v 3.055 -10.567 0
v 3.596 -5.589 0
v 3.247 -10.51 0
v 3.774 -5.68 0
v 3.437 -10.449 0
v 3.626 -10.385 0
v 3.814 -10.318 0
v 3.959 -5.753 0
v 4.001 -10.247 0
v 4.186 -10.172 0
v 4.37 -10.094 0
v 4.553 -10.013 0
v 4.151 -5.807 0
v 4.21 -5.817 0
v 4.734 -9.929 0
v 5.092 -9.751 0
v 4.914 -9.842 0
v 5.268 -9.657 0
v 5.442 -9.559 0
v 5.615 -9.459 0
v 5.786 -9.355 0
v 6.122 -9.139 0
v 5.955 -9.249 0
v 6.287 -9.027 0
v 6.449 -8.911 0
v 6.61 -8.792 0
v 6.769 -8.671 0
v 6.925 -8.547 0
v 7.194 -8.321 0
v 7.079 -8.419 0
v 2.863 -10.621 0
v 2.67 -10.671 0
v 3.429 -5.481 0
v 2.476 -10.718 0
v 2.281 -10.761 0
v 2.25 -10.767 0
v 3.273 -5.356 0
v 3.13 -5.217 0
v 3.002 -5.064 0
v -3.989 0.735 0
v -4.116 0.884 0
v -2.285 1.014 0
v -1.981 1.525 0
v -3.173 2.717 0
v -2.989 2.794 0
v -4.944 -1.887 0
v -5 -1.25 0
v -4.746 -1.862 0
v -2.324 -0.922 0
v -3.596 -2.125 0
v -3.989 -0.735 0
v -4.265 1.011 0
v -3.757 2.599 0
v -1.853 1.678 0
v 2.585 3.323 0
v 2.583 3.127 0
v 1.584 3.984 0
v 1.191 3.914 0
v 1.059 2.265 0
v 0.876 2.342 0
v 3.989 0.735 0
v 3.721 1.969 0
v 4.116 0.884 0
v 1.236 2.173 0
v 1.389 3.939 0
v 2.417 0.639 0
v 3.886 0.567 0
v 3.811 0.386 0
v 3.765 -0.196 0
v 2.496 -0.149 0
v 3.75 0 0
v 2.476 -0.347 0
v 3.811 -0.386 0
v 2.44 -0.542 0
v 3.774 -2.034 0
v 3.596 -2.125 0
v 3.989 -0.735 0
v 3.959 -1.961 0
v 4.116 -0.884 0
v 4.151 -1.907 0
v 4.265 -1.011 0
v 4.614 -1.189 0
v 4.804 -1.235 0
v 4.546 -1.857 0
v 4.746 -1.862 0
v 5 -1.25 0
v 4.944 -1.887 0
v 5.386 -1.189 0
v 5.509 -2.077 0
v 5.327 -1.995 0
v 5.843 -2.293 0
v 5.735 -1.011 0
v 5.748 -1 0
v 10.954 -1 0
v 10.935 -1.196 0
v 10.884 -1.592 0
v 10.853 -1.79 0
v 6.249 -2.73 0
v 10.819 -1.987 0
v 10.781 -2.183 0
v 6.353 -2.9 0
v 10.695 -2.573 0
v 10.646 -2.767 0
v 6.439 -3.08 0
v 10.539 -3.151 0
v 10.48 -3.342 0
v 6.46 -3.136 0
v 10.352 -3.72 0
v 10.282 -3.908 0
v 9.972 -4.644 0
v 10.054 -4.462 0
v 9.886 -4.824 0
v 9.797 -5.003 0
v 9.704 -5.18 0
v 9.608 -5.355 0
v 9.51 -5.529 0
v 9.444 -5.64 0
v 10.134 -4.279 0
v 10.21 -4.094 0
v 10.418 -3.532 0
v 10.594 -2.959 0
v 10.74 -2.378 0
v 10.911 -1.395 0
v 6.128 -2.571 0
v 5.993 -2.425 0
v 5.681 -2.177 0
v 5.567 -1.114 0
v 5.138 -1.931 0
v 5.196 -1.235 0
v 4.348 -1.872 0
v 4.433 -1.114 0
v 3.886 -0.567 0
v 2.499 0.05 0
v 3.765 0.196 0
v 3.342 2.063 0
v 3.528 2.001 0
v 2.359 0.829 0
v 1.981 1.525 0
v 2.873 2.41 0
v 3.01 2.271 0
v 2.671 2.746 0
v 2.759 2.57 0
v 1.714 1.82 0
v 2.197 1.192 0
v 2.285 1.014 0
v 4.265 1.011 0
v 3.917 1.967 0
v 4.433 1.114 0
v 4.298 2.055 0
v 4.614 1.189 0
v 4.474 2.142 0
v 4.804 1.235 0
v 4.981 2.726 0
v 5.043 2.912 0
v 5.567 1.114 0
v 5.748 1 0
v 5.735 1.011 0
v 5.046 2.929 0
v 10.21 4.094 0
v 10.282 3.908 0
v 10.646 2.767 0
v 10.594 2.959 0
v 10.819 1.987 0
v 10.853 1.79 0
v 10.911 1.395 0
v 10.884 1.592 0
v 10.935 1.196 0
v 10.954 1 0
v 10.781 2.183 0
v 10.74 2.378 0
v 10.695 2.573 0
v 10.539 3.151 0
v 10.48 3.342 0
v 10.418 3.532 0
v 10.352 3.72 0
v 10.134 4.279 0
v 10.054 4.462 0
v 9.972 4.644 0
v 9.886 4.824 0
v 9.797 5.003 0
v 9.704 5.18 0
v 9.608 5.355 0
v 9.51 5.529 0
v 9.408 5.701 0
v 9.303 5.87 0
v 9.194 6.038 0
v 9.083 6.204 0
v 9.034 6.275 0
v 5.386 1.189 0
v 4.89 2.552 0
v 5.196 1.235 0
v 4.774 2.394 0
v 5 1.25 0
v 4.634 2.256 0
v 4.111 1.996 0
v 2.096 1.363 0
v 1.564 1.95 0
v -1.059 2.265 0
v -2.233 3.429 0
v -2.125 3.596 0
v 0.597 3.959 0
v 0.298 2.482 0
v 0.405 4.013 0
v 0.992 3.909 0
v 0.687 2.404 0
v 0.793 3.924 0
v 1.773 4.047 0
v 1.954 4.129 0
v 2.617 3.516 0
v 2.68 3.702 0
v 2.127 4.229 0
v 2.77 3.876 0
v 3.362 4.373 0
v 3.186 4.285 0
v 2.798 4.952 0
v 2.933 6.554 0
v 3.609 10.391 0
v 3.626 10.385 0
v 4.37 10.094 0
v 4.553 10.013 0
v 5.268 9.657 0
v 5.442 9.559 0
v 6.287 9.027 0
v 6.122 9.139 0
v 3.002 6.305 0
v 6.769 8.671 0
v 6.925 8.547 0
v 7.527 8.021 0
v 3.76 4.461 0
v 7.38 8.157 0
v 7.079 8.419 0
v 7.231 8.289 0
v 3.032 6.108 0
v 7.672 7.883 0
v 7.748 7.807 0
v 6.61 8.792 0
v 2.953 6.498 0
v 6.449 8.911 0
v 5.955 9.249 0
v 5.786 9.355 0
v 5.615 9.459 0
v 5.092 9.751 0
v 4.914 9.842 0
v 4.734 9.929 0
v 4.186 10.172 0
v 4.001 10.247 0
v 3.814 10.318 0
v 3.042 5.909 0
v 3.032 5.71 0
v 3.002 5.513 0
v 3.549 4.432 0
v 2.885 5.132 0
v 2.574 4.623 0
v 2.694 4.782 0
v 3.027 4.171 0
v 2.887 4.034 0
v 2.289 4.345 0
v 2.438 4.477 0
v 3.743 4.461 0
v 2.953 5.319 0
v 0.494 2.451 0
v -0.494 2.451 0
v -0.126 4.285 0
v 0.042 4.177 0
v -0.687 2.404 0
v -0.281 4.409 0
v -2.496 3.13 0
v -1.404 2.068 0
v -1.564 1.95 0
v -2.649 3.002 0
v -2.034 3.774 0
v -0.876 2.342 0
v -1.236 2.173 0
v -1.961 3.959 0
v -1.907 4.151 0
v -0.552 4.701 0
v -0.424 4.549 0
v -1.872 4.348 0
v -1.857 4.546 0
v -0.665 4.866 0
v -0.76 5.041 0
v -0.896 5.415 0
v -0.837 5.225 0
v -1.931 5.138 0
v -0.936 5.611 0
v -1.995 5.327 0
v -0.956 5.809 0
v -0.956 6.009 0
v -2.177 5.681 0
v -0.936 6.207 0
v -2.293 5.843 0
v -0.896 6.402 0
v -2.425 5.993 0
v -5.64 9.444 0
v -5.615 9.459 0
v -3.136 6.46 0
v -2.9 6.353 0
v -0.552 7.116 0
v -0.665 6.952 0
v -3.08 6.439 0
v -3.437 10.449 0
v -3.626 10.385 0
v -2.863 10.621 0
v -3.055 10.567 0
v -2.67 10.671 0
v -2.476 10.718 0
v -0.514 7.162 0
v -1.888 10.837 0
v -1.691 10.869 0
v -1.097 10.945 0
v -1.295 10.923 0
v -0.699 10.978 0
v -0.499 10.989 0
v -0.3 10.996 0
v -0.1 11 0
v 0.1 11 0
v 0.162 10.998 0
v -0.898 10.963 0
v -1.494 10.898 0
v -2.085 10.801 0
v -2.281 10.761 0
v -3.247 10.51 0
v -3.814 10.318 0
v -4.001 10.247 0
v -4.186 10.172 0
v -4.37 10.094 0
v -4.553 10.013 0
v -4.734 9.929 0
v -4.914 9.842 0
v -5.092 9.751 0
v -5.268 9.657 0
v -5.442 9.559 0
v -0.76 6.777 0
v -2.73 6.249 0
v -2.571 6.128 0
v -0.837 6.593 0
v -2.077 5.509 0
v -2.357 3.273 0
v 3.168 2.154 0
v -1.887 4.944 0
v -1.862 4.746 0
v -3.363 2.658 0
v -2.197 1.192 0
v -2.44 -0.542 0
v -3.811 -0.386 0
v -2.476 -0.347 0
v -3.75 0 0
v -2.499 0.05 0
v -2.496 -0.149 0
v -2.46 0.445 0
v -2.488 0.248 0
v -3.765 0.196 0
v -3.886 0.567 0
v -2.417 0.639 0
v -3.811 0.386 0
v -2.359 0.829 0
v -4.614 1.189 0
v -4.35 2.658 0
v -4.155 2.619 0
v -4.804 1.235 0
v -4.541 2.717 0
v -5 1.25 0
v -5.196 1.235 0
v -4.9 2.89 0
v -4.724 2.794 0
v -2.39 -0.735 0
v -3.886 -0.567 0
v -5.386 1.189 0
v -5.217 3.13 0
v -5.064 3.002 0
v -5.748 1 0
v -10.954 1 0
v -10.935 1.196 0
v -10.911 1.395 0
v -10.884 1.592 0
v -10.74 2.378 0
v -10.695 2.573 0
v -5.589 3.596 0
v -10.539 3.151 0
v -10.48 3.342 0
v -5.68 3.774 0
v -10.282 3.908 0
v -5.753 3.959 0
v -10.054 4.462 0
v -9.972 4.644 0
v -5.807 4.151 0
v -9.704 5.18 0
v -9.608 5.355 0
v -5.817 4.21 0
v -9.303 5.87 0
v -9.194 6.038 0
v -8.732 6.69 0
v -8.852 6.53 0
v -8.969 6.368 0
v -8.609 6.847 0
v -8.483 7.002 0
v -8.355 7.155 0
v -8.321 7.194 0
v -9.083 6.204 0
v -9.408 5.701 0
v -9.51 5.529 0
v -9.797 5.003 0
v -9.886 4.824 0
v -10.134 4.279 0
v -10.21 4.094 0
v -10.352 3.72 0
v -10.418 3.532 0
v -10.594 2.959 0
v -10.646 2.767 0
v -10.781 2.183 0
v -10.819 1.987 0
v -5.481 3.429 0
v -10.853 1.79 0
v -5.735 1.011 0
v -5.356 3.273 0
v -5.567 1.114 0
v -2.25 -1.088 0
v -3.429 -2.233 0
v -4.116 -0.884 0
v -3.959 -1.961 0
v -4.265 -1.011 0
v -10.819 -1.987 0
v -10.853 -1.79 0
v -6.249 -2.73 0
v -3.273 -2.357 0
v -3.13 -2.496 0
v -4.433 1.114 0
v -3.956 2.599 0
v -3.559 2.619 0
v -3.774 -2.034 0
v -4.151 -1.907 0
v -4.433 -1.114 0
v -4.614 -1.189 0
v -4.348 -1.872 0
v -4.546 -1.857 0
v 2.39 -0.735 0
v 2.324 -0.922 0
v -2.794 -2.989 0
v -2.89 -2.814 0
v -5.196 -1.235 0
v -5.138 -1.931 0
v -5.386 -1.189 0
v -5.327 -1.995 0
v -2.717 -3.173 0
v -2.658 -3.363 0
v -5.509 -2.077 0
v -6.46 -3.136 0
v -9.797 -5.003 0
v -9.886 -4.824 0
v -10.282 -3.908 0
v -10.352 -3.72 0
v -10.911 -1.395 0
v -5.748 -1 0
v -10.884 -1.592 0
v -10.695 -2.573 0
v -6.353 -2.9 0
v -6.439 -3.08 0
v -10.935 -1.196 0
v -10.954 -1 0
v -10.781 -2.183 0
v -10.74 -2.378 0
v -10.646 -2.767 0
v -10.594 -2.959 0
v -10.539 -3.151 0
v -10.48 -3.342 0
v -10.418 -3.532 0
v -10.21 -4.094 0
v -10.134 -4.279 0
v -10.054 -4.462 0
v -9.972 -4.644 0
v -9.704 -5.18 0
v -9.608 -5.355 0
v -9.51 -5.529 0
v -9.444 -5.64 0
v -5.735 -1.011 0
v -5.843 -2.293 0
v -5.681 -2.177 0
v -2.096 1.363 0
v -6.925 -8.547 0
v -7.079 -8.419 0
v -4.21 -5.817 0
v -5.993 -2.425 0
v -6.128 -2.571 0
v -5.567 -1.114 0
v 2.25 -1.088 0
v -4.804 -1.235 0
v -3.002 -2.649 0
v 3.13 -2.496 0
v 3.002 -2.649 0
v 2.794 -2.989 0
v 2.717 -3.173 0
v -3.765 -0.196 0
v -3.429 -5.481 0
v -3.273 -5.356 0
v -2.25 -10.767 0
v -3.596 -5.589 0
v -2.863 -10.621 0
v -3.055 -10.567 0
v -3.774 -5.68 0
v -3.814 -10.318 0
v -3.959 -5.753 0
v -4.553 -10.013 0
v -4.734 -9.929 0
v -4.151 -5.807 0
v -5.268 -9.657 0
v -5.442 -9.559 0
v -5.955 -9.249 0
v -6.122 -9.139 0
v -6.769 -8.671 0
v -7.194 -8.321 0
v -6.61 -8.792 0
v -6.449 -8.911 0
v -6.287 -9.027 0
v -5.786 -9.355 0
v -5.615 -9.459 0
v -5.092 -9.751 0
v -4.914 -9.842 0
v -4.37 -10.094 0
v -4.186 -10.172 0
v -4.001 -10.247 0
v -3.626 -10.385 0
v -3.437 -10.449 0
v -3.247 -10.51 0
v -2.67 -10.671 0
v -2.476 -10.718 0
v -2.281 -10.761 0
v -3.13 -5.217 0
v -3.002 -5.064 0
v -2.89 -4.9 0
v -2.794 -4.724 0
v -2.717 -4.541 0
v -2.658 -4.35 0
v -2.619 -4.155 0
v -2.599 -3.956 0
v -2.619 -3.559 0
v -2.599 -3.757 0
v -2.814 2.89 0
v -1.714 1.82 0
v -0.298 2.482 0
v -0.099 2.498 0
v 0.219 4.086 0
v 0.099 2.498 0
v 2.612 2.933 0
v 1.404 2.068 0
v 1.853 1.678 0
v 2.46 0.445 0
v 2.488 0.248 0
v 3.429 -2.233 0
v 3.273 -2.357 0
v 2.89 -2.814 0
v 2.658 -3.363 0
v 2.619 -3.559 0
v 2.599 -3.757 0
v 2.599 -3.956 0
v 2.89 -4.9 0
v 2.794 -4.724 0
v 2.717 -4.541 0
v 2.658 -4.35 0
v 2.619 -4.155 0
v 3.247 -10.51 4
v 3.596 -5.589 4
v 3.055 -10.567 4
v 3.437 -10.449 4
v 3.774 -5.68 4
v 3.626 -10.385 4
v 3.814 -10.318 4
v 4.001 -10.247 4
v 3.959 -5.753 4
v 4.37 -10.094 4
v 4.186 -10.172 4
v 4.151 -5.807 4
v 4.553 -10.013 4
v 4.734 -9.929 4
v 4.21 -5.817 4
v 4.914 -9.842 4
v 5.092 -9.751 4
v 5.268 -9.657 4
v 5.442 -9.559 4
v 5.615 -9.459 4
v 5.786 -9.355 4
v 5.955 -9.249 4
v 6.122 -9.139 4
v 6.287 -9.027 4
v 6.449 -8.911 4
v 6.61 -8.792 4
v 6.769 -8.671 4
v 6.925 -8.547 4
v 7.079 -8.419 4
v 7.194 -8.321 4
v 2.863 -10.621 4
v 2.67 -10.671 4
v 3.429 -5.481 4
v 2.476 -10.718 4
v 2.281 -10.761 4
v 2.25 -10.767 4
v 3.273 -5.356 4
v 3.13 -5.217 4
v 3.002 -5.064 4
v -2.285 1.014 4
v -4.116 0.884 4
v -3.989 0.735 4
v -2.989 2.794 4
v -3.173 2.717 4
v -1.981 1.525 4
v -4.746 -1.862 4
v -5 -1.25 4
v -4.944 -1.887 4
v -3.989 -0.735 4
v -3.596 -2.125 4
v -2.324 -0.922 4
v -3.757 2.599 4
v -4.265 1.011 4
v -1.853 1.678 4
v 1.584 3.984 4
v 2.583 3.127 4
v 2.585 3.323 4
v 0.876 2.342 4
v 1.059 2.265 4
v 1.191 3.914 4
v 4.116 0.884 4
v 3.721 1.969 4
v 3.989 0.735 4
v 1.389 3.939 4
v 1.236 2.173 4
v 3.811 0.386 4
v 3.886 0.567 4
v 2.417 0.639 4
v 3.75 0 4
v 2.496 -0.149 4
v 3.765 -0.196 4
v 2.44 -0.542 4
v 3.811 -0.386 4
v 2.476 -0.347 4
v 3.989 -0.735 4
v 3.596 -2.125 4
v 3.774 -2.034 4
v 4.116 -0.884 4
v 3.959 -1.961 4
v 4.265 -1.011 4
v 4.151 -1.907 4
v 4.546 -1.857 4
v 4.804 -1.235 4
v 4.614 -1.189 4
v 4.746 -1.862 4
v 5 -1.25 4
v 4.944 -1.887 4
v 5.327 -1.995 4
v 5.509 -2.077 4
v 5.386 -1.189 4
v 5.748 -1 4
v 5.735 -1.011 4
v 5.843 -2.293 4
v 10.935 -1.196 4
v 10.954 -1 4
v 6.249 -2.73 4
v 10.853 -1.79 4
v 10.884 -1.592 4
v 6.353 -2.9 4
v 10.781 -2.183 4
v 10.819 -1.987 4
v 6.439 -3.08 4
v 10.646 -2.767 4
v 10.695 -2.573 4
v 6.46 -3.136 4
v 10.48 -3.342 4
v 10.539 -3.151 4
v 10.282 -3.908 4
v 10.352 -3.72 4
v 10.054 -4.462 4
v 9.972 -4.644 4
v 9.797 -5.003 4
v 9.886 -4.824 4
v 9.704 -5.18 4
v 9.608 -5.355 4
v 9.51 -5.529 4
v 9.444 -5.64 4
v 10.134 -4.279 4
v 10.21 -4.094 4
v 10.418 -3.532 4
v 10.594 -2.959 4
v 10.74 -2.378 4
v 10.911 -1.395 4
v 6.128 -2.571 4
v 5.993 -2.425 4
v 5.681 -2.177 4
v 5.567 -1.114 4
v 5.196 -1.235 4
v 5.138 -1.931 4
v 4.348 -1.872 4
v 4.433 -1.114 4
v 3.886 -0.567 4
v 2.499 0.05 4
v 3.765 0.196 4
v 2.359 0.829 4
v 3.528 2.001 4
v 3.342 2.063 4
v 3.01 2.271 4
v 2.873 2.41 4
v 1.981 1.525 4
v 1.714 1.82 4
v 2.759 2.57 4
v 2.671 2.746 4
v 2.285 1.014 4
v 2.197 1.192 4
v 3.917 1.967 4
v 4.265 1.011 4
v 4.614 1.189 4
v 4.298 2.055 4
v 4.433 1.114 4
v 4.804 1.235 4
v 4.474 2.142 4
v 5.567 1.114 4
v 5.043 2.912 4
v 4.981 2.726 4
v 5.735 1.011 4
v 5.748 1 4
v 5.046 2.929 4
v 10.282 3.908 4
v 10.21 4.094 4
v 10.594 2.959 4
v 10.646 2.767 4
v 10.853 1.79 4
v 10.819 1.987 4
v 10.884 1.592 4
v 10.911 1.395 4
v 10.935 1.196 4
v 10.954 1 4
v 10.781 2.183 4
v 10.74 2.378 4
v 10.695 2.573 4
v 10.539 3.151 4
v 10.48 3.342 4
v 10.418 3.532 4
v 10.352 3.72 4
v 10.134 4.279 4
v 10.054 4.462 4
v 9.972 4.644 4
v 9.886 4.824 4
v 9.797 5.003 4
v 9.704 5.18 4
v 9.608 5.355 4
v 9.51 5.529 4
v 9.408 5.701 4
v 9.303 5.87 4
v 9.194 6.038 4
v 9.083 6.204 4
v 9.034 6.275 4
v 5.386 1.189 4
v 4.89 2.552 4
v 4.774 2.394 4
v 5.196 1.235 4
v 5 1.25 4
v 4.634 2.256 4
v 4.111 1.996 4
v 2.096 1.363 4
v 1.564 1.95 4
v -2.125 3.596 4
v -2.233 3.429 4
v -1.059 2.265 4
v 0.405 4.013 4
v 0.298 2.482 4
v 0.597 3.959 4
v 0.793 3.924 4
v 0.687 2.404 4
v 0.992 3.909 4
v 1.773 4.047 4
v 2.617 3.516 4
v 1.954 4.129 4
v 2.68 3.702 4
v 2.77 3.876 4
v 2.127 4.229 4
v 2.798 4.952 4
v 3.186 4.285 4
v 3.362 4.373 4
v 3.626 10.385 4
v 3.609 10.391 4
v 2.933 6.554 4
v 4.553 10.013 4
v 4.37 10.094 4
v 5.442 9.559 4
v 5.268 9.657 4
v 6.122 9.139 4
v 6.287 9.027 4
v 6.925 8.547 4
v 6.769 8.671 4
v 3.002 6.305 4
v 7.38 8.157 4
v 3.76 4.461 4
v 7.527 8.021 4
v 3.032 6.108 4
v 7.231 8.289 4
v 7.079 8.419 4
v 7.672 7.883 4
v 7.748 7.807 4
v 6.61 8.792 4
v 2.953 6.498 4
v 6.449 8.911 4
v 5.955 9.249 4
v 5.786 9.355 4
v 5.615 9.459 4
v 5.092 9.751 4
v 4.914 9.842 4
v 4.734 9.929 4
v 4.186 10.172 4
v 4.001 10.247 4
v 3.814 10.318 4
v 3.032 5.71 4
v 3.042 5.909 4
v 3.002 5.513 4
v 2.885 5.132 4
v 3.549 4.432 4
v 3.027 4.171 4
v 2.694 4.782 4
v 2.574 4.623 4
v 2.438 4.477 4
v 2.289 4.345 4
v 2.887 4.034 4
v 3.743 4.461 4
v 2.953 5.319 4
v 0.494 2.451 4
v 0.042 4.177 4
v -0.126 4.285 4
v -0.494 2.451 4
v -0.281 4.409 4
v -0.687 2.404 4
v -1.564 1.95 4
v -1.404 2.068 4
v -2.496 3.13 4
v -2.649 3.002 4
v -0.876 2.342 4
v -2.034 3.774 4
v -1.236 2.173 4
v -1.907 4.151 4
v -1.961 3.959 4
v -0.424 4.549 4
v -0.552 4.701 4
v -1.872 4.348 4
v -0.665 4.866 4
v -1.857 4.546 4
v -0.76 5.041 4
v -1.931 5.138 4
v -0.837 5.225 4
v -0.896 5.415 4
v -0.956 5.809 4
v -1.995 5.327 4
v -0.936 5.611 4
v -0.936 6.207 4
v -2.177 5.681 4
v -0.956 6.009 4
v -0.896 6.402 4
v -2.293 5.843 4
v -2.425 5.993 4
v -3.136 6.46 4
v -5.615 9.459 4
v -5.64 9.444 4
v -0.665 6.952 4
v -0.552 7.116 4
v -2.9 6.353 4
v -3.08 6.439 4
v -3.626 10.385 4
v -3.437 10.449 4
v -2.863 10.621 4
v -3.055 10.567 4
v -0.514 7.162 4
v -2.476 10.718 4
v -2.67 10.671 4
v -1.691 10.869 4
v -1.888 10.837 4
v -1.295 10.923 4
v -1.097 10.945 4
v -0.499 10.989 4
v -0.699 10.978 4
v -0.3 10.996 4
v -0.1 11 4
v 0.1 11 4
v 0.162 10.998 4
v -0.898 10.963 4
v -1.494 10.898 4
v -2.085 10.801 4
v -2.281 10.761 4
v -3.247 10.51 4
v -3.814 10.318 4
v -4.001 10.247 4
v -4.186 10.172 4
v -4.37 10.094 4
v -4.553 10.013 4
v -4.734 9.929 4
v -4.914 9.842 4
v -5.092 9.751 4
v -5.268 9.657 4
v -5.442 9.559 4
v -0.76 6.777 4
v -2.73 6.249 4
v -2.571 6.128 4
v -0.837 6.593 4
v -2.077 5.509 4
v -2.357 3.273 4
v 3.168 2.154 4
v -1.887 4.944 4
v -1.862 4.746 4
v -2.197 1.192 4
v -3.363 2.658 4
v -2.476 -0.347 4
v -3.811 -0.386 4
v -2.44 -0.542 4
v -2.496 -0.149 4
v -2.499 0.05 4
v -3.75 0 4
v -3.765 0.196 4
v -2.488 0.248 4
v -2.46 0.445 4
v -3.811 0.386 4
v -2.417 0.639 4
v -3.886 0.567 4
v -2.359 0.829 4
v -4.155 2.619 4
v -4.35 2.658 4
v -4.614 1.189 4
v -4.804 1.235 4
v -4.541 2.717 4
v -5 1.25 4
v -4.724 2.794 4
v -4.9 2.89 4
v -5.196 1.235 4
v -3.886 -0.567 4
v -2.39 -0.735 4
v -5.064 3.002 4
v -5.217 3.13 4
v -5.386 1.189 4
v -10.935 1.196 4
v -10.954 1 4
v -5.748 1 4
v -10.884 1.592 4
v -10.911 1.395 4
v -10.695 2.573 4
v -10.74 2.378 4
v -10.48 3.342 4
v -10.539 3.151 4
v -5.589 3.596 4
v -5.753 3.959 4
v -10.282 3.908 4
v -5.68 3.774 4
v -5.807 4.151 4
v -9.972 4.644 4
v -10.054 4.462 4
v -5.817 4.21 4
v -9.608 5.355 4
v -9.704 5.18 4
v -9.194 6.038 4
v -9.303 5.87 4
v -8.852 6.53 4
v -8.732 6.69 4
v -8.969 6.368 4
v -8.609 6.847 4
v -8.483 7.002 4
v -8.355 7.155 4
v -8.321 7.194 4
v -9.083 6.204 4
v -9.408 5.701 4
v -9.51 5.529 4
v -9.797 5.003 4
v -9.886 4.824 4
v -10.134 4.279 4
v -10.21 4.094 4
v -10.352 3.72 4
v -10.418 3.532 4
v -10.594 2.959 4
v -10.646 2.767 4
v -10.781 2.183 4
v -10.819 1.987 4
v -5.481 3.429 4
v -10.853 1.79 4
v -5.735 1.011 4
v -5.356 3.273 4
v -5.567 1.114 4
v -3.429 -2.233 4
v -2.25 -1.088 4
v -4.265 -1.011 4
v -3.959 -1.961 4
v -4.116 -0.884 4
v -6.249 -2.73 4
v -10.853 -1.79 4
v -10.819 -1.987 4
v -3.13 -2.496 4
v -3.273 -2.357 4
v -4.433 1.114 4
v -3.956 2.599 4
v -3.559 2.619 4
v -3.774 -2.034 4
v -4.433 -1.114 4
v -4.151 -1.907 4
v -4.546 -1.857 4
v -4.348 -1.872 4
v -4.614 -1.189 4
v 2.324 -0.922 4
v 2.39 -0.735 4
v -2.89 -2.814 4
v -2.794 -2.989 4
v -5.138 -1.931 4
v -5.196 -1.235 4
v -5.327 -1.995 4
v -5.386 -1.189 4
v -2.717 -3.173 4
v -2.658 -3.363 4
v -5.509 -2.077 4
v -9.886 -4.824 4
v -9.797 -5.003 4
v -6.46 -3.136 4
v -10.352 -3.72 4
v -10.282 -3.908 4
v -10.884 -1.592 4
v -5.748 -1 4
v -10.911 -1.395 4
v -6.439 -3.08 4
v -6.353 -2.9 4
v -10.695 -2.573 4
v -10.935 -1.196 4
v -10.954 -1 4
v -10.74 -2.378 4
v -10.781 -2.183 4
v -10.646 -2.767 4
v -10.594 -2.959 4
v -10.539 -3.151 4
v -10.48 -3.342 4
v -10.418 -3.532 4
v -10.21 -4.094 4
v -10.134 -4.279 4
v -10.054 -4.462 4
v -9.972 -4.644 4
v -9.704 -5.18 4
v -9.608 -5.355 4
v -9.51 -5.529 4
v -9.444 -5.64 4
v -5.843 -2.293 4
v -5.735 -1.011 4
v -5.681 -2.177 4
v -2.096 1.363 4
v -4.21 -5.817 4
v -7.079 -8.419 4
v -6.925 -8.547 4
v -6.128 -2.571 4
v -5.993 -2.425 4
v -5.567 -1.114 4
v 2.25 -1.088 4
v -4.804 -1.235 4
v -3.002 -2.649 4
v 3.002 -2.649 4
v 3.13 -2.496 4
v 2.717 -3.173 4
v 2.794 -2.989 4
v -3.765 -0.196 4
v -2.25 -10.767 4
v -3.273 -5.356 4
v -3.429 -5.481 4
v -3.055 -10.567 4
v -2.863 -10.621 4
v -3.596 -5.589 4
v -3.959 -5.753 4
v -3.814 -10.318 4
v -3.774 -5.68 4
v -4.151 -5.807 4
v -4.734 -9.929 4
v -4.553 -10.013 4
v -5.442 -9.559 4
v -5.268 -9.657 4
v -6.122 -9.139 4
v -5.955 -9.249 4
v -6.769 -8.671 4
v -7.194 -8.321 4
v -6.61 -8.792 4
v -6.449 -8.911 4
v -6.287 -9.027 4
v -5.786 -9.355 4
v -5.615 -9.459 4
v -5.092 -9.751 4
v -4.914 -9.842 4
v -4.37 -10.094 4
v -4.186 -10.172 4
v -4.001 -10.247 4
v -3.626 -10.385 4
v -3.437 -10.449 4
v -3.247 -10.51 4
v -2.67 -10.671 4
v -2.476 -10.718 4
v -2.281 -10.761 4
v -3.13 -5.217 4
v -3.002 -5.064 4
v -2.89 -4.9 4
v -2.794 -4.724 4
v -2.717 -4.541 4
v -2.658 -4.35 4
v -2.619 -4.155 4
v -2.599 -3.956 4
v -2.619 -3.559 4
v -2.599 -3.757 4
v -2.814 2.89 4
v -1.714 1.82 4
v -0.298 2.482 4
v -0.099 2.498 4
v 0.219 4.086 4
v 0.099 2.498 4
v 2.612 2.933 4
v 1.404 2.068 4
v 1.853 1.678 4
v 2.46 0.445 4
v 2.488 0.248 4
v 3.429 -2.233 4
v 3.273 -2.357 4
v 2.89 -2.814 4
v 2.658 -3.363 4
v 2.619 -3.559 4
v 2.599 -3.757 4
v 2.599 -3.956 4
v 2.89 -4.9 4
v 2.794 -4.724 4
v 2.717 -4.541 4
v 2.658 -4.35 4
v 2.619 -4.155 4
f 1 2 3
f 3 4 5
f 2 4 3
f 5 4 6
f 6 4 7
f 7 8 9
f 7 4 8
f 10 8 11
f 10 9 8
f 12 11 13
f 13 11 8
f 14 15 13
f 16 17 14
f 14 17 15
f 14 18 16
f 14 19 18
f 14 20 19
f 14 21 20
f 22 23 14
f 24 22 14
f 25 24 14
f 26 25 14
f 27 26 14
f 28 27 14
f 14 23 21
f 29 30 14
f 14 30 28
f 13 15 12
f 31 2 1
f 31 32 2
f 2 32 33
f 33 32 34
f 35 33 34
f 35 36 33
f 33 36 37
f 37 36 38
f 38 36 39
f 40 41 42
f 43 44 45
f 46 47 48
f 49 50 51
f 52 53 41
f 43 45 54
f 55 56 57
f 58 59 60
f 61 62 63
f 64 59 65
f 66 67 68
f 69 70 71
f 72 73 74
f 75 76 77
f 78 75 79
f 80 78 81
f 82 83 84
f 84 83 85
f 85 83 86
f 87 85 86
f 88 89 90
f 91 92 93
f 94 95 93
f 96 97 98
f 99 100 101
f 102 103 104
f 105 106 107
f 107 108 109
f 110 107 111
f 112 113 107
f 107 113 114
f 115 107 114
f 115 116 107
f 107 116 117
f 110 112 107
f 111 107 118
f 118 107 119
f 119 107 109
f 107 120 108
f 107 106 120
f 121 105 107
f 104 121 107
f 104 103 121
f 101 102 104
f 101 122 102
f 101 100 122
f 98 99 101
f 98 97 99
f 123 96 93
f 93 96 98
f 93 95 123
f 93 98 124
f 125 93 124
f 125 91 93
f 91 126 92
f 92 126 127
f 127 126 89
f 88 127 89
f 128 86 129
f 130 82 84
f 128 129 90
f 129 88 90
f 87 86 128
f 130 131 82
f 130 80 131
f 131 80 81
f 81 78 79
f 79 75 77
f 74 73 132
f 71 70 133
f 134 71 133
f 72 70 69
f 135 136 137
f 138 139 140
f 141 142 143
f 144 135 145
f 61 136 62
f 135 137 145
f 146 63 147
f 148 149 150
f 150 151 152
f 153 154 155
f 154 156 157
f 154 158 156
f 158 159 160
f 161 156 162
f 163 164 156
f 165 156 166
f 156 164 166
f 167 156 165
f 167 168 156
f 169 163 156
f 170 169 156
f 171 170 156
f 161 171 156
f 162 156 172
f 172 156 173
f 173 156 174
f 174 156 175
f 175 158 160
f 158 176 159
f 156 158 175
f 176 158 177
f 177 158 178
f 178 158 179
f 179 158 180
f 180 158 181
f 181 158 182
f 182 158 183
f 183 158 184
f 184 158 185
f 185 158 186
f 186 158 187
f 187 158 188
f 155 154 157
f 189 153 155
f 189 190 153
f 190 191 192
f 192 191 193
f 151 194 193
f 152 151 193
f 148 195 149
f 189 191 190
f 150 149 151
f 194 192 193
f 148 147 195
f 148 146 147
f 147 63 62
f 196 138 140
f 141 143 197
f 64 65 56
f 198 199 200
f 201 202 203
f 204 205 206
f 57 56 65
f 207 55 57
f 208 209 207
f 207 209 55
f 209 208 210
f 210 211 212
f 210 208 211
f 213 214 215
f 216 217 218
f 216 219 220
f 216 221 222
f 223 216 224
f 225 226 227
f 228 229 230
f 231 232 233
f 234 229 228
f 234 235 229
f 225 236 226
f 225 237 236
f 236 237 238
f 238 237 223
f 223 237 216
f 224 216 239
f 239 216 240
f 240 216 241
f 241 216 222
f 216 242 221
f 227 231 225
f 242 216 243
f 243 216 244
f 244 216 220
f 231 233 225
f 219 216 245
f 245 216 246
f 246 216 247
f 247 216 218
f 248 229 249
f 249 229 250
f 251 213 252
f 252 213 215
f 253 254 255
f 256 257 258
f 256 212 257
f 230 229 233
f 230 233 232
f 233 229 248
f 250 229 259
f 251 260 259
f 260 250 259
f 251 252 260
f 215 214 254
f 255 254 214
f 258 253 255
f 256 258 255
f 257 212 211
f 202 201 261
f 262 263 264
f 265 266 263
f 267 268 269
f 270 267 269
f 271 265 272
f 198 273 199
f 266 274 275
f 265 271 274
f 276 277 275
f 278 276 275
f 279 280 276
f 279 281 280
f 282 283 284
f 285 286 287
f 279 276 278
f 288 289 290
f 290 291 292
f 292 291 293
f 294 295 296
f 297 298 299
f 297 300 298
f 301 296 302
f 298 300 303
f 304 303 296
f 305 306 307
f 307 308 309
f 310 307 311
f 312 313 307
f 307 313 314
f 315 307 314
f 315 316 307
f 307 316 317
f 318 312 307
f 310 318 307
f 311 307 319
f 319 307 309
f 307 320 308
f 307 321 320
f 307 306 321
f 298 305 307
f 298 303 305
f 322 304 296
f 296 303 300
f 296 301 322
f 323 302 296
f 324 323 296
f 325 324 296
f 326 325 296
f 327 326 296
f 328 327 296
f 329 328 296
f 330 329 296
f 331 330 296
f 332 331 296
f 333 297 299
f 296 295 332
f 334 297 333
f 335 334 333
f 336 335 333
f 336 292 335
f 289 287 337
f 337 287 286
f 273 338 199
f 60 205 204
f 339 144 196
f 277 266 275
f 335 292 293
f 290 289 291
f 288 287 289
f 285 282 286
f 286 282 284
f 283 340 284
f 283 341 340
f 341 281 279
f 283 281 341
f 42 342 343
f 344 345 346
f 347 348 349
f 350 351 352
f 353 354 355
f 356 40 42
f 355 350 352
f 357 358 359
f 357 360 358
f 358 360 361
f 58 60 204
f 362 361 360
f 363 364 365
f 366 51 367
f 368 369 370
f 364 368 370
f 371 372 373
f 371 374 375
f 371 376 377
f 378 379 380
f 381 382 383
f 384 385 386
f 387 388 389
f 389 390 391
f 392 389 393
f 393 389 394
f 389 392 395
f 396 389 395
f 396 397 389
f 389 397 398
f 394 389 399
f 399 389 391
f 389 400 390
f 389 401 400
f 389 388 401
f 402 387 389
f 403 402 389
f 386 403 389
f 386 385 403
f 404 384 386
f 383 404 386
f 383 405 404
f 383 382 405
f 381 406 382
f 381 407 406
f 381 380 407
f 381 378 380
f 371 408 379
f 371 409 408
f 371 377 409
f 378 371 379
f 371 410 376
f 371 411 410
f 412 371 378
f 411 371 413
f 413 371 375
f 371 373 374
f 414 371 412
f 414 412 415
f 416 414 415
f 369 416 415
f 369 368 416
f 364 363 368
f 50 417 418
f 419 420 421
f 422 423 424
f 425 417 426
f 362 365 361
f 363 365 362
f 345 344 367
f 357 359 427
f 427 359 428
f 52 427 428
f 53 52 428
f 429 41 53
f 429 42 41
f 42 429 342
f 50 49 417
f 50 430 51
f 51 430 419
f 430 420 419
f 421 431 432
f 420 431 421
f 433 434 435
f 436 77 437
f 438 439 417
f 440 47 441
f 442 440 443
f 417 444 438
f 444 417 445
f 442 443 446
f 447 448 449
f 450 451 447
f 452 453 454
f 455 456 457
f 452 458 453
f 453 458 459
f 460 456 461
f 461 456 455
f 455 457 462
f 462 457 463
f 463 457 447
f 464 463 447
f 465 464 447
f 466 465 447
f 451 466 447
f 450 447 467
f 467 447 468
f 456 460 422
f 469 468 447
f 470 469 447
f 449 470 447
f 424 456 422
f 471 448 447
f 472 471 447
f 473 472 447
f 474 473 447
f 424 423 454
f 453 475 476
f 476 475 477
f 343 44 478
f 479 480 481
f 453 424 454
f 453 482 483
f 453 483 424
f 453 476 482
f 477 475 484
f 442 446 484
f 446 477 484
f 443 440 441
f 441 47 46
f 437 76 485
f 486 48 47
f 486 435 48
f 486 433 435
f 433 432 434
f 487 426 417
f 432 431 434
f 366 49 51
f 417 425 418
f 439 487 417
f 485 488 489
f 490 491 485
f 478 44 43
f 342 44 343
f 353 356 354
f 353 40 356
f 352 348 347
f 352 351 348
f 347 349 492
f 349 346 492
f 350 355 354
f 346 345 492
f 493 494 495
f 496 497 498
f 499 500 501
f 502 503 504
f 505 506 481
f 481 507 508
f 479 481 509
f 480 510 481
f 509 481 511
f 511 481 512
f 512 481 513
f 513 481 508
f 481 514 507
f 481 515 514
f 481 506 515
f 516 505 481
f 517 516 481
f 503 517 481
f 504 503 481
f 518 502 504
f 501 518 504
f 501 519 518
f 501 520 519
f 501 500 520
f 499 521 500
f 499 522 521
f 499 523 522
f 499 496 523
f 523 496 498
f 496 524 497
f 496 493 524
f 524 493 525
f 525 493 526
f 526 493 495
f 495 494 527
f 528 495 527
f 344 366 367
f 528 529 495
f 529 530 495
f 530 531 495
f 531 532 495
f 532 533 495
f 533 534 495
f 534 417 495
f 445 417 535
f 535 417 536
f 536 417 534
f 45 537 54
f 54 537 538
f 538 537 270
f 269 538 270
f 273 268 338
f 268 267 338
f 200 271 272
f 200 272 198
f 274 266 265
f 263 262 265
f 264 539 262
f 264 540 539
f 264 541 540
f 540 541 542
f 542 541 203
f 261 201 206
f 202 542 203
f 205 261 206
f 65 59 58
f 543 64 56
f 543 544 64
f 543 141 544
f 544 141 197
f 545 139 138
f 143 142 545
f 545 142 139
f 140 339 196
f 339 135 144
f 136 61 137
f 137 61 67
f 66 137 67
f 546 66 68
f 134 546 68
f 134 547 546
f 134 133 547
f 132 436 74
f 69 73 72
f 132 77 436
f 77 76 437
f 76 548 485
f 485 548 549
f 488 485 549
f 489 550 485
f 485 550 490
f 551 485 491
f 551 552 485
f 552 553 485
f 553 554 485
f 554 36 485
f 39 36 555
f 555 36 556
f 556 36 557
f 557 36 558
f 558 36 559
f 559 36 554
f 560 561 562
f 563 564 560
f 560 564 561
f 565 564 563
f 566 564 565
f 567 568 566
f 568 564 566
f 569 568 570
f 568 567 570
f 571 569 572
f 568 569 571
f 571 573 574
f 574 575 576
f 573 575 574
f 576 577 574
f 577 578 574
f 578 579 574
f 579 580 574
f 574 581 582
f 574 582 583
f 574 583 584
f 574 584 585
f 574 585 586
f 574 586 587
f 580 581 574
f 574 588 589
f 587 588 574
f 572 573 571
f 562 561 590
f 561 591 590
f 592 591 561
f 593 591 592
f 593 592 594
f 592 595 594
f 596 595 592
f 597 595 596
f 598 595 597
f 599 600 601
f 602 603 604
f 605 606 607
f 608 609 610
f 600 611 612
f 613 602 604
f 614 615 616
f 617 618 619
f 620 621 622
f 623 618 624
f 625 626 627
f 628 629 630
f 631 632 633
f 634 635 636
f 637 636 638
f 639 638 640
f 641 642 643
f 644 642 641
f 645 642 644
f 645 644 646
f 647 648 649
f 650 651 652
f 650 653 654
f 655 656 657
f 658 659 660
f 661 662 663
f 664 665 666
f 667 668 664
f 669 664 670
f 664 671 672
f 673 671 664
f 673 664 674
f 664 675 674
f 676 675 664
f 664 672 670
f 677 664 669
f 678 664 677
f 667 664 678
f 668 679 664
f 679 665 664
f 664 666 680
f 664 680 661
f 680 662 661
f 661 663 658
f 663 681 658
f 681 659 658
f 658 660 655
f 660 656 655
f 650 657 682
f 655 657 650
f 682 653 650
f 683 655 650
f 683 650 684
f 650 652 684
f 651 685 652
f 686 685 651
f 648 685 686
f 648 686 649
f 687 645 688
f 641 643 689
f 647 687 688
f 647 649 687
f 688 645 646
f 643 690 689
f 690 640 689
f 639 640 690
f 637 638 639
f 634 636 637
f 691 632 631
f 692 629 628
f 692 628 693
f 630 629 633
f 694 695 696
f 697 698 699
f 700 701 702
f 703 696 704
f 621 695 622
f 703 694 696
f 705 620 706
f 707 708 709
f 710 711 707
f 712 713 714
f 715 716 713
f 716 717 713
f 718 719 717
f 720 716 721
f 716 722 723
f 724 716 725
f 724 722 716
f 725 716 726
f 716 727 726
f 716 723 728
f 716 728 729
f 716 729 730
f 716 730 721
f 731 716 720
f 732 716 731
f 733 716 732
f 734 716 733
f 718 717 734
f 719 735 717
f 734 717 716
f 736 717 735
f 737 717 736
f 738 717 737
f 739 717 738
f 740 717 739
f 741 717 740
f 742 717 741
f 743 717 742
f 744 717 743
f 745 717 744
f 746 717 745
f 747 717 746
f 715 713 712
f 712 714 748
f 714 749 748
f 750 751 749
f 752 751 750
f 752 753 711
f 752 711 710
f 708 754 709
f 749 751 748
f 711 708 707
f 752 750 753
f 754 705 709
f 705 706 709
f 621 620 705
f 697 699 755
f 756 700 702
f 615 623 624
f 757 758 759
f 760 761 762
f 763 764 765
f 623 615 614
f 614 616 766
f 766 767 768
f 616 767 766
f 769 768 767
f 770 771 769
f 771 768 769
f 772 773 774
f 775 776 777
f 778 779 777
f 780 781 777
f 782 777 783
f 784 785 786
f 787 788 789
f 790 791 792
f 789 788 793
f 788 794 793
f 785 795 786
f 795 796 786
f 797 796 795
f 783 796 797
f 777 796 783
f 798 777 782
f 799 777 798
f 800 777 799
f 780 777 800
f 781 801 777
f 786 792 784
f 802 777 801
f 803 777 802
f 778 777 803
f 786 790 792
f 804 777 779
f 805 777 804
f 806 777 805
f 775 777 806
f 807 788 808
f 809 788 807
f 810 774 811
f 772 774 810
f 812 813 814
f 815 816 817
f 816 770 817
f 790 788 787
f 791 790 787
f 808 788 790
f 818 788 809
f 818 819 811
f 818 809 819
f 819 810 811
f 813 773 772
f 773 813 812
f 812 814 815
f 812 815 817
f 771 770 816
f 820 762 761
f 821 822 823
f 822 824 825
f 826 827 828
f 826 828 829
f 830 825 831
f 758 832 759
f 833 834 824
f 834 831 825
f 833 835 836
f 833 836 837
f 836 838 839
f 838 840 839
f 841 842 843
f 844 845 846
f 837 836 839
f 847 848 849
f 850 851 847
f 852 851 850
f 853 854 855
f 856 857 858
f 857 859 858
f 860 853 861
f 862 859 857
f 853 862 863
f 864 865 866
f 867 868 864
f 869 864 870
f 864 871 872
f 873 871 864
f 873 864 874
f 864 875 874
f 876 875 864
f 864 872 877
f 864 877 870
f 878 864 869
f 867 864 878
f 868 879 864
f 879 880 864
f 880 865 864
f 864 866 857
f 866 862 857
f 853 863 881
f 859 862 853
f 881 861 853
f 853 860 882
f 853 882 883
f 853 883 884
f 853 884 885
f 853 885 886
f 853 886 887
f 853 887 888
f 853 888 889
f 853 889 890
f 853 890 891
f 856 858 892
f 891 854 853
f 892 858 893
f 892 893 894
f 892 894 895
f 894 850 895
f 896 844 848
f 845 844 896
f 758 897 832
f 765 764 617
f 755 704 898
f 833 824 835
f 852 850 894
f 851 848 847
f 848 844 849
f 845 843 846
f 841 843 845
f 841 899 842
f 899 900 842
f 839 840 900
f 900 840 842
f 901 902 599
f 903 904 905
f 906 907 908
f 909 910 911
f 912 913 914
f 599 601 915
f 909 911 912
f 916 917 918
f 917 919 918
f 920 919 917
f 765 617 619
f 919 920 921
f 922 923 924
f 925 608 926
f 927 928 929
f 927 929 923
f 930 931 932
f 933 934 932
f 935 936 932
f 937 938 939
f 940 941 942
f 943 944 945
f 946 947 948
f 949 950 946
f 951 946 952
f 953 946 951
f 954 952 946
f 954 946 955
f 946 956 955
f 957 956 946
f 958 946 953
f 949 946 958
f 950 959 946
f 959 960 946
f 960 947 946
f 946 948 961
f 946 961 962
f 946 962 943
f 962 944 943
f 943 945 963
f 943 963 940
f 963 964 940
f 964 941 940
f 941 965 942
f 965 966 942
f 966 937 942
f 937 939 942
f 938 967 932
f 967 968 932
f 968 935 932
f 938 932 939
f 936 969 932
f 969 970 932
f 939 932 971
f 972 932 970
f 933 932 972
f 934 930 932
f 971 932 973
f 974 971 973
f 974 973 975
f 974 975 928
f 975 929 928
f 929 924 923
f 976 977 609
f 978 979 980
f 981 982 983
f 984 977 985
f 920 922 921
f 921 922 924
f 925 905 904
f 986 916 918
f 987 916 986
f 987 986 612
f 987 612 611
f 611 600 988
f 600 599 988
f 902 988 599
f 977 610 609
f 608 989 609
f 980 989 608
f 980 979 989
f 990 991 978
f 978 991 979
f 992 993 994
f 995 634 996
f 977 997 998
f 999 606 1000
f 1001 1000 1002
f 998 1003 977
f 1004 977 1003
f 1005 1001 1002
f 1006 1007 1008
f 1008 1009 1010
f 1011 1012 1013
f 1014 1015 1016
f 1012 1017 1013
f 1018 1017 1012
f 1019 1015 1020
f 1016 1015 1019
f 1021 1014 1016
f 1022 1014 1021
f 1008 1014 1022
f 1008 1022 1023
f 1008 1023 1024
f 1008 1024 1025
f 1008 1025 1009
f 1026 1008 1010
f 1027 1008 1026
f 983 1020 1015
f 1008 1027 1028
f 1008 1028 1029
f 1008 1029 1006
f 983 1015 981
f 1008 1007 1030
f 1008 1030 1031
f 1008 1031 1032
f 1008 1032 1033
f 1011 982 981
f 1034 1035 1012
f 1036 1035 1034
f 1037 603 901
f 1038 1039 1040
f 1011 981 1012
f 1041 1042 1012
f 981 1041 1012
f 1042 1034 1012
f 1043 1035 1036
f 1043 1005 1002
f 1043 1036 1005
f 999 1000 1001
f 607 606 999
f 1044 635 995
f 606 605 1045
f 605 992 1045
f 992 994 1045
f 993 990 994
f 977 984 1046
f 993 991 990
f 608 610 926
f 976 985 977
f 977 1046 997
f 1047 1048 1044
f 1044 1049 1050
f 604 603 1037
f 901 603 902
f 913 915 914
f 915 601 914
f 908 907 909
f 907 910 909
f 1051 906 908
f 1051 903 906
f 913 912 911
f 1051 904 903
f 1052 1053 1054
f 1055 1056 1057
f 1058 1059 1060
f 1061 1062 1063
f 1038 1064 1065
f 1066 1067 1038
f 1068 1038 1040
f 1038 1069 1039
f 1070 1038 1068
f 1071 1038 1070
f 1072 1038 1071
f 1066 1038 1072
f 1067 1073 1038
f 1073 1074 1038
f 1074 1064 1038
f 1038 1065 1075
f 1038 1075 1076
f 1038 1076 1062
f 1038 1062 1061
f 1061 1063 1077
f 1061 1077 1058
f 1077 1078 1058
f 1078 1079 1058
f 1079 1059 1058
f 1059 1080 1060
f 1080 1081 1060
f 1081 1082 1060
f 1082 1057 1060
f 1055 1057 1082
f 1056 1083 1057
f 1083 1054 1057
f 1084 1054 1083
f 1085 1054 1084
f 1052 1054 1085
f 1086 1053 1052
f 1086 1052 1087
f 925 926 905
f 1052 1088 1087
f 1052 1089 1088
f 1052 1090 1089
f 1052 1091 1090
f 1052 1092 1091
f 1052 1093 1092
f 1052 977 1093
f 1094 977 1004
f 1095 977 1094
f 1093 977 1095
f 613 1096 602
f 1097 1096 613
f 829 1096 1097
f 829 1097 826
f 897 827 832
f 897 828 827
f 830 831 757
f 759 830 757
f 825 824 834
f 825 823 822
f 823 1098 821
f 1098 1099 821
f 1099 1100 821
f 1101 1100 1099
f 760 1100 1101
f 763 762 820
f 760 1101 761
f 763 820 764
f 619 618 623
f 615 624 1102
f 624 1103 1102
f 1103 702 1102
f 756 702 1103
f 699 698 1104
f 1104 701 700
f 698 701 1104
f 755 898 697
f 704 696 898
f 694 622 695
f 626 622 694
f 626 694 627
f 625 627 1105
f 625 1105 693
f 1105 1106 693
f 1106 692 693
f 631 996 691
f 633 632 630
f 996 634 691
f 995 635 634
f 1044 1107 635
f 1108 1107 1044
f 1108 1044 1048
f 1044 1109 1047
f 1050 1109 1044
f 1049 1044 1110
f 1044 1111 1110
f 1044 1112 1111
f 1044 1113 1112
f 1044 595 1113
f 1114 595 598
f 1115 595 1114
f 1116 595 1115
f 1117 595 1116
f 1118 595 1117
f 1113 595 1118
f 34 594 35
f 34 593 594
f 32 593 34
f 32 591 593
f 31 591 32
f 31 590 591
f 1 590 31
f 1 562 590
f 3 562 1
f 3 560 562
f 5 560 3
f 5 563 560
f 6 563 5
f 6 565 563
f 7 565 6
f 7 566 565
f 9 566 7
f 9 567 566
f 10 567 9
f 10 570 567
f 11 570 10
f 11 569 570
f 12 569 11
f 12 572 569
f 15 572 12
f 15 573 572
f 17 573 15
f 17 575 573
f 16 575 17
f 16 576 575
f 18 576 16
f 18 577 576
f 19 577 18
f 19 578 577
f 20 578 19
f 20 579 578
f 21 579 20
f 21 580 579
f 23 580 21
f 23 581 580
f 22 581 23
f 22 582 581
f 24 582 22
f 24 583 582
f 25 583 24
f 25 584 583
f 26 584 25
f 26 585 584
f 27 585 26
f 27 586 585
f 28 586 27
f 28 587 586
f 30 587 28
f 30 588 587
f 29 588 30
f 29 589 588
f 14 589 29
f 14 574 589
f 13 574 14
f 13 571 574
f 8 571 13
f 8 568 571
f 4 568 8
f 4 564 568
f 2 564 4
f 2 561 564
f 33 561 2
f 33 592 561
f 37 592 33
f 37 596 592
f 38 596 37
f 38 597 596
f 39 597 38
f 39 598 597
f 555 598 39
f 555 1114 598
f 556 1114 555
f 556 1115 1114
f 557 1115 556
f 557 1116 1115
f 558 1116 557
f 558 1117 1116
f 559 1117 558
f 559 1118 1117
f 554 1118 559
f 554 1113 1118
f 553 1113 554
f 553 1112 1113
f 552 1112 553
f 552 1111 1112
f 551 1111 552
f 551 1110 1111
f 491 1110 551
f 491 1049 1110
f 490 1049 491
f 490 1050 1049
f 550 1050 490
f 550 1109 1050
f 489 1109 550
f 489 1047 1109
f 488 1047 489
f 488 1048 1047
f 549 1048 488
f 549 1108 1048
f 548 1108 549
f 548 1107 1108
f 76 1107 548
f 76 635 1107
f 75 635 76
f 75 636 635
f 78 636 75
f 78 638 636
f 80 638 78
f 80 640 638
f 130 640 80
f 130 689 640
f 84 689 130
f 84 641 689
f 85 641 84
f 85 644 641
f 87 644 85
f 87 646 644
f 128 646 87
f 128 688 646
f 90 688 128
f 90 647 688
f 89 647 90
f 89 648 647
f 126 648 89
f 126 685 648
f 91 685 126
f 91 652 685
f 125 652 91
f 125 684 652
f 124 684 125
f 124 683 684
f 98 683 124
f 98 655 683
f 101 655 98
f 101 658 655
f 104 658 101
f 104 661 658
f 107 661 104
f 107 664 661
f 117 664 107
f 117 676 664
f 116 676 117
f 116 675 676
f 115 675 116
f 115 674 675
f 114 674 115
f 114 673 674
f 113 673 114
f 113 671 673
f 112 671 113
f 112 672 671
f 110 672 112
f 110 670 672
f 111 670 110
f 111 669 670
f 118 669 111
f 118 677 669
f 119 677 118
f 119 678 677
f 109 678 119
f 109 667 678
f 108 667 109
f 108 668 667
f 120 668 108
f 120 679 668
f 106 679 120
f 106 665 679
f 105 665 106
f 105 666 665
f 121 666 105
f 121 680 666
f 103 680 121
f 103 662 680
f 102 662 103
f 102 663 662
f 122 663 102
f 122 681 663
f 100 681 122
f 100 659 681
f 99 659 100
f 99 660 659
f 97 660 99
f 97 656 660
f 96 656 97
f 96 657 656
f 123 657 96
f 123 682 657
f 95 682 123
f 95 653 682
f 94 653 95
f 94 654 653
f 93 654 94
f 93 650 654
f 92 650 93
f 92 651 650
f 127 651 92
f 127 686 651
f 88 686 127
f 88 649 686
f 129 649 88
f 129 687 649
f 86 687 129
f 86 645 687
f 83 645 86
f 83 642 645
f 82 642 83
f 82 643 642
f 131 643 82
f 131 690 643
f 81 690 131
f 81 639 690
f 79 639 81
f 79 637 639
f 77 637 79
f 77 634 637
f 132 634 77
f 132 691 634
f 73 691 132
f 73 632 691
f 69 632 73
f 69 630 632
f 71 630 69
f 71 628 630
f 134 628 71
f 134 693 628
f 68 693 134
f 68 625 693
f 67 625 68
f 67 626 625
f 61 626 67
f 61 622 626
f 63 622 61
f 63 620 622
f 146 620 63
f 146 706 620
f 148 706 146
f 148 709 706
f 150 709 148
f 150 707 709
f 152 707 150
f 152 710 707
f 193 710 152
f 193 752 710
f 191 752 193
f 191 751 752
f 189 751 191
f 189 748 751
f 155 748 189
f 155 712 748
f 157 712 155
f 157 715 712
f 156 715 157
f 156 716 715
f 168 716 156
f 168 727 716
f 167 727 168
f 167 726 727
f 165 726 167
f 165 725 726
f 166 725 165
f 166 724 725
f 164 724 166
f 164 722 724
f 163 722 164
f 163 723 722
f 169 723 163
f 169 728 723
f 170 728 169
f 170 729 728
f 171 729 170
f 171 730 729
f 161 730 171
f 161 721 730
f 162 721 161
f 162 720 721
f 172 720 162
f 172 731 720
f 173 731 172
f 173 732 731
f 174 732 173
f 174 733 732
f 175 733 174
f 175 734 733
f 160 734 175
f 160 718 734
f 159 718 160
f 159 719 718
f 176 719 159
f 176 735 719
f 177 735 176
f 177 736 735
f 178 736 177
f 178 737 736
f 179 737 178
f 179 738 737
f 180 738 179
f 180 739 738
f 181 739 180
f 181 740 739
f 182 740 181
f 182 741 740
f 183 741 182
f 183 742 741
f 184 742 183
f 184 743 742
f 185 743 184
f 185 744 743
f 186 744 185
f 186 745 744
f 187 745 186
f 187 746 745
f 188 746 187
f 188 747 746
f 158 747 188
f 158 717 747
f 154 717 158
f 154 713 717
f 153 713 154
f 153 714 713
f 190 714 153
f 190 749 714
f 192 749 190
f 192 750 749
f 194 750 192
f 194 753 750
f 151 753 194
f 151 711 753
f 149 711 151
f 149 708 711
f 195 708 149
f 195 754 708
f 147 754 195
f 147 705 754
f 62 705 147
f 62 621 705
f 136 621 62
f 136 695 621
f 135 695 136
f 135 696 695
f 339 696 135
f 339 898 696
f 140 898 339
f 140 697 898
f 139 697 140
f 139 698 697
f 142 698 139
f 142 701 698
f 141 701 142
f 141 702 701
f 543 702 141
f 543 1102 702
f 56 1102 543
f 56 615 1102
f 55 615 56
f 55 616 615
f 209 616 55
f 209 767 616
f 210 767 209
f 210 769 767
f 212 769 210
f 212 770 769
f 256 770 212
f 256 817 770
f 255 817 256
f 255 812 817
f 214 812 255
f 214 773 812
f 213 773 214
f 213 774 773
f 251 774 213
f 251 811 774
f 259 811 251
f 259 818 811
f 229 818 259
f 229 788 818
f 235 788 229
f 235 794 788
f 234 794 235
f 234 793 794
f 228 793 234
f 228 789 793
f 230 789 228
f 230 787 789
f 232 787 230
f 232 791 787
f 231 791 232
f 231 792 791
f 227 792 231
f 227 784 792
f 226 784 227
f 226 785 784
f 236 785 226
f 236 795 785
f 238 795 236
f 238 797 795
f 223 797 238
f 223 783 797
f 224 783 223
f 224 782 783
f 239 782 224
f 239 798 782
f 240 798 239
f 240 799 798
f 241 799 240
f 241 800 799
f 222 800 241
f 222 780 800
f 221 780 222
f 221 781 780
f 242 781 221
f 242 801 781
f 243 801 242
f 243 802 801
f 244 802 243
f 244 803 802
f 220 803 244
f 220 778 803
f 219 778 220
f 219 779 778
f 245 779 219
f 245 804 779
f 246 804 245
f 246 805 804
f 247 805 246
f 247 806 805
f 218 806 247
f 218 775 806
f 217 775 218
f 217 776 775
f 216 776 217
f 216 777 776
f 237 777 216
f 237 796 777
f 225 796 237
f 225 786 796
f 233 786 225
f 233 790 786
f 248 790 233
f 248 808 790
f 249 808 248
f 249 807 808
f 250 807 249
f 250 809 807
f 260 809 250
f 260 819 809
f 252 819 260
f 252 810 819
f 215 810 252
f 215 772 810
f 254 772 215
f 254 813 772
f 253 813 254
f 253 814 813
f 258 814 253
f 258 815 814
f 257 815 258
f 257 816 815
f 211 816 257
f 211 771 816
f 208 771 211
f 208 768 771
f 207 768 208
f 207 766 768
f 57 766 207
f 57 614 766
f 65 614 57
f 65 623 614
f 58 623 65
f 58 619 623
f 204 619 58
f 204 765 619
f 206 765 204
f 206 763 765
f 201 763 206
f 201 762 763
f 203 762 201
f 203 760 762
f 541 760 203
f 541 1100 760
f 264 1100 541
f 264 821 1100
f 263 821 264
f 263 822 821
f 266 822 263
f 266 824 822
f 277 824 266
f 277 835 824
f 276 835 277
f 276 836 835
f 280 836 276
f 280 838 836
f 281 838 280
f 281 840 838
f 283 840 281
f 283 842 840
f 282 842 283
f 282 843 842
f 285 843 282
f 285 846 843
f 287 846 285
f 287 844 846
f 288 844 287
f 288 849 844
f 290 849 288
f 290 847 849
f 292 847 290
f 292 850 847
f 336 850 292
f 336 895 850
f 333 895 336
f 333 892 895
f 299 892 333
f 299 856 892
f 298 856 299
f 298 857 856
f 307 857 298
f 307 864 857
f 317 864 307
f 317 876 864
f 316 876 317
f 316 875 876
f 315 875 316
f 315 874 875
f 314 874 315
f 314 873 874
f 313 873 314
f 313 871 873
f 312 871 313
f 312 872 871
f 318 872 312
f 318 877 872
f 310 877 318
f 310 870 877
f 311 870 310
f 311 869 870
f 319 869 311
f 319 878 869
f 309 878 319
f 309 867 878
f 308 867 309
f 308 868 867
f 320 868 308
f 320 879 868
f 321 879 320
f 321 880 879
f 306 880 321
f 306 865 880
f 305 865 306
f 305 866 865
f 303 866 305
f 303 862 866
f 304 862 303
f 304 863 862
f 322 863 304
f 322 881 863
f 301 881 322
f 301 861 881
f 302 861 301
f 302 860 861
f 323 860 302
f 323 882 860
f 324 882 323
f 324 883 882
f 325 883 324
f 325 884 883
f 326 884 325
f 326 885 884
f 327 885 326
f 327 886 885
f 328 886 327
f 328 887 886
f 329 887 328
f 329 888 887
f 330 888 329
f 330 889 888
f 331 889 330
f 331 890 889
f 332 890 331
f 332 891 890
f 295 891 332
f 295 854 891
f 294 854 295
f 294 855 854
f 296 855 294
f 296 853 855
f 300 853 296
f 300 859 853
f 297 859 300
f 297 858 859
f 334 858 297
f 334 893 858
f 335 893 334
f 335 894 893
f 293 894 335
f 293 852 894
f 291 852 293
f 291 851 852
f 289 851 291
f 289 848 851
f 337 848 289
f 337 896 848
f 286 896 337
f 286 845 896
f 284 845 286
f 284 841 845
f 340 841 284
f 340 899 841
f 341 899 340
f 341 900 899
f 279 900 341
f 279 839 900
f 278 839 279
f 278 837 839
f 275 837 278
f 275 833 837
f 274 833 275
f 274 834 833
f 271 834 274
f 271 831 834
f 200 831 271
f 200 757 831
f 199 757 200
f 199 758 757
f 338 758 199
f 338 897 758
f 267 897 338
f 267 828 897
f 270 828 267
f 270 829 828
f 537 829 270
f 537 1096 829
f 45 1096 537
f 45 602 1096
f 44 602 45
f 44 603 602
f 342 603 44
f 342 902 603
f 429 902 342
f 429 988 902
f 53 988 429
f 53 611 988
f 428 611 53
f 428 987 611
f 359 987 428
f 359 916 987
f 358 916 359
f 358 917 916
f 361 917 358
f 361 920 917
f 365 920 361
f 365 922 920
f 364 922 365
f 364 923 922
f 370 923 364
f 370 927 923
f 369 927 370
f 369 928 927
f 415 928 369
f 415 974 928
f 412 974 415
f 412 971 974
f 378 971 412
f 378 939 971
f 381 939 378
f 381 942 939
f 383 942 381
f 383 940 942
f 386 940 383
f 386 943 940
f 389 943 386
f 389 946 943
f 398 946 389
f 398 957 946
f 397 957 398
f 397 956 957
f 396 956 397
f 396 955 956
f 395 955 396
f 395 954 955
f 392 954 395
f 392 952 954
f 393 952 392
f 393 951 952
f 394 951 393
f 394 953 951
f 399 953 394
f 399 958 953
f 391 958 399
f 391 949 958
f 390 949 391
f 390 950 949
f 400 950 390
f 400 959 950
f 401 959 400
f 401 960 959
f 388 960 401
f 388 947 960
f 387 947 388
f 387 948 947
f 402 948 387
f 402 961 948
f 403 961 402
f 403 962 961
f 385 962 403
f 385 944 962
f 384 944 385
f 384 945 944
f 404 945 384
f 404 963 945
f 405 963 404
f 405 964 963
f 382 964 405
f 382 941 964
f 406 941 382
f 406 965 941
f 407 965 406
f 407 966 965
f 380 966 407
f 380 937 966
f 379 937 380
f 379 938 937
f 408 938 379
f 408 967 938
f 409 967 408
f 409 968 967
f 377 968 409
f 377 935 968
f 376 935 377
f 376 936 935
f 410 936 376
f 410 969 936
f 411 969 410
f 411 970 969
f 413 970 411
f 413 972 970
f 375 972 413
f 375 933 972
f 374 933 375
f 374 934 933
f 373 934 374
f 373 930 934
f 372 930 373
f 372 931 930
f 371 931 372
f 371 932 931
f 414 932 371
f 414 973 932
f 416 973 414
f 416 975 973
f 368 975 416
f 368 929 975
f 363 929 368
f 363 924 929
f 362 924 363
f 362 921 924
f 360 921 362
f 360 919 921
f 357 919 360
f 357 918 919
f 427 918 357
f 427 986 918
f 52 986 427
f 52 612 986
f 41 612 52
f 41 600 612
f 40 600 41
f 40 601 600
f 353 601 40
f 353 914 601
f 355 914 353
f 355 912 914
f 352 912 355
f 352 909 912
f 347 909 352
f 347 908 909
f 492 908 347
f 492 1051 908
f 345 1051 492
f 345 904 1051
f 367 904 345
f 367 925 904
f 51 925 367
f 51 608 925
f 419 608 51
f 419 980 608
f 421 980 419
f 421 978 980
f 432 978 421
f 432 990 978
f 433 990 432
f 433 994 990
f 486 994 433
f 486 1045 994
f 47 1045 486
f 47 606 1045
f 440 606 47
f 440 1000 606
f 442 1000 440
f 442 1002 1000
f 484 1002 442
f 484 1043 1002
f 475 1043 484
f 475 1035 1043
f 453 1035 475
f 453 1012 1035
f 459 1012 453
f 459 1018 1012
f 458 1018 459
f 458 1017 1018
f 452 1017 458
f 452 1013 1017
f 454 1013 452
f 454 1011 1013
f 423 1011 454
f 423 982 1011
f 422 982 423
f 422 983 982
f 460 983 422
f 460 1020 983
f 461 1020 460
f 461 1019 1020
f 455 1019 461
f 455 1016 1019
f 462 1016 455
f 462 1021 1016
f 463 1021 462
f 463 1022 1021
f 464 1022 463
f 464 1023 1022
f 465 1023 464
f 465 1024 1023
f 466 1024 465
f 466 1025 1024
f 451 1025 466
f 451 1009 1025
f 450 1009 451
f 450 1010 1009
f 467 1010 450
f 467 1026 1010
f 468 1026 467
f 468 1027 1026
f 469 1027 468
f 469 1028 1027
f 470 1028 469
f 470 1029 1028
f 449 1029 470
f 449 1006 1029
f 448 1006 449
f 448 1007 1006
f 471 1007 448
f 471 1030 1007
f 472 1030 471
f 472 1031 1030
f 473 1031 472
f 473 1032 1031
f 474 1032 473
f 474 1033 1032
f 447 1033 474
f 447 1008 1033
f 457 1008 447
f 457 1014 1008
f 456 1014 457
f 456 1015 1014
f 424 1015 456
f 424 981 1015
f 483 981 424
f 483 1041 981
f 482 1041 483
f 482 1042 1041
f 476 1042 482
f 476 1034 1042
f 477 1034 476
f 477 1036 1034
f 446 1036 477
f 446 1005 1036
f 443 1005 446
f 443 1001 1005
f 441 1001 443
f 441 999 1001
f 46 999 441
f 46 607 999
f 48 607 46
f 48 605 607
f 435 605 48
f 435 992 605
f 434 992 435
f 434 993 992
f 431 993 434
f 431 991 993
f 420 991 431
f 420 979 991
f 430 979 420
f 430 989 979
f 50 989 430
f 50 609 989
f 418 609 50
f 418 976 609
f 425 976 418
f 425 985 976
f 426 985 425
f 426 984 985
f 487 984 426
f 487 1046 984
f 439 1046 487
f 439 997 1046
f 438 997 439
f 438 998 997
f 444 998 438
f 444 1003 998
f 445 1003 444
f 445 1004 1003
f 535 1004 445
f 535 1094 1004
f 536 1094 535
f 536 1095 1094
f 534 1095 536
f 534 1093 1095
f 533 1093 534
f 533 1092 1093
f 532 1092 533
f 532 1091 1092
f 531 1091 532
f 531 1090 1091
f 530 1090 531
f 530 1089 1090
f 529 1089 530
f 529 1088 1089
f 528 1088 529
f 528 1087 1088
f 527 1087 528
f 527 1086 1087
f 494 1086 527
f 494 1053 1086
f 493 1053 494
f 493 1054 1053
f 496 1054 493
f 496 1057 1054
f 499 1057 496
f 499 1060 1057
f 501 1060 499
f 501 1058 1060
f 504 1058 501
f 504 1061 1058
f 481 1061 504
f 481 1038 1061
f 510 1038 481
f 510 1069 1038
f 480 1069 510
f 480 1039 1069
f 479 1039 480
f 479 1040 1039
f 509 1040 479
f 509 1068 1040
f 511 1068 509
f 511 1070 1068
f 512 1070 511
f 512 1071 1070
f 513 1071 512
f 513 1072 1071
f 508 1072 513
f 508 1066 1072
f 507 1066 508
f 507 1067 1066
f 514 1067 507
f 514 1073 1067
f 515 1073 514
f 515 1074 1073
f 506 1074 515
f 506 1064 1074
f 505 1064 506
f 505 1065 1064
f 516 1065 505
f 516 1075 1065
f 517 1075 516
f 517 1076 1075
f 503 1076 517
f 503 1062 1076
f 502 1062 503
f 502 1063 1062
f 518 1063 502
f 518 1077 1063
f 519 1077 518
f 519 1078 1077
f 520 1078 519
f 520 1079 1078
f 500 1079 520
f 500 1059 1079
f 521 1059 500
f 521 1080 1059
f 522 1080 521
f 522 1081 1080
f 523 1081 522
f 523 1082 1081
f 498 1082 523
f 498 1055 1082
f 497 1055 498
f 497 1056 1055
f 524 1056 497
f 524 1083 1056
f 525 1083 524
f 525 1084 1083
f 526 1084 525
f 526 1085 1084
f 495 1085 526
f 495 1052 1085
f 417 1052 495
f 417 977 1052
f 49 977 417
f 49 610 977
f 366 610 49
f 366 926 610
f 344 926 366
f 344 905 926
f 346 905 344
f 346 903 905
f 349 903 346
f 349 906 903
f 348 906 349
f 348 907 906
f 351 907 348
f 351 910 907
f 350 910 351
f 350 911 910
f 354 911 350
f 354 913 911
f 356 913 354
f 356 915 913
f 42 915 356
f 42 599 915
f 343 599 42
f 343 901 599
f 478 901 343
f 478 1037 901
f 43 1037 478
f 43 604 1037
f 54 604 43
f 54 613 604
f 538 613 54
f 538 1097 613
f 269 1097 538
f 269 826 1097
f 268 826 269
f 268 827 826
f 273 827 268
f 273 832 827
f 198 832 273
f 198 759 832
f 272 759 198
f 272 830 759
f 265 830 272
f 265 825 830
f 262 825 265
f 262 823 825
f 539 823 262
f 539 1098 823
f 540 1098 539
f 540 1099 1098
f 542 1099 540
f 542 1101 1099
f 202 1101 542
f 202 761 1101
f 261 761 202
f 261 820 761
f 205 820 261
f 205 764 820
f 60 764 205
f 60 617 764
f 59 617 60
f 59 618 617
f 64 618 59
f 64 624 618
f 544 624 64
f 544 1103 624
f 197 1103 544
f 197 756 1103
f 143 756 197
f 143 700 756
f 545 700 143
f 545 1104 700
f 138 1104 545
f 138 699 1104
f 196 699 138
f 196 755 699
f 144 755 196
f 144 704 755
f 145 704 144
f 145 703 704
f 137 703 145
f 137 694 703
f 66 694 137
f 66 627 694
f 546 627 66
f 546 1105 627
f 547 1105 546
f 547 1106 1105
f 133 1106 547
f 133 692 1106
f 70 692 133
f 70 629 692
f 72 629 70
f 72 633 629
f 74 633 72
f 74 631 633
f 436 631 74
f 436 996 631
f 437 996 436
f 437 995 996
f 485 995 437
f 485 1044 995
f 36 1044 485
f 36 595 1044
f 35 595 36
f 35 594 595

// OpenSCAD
$fa = 0.2;
$fs = 0.2;

layers = [
    [0,[[-90,5]]],
    [
        6,[
            [80,4],
            [130,4],
            [220,4],
            [270,4],
            [320,4],
        ]
    ],
    [
        5, [
            [0,2.5],
            [40,2.5],
            [180,2.5],
            
        ]
    ]
];

linear_extrude(4)
difference() {
    circle(d = 22);

    for (i = [0:len(layers)-1]) {
        layer = layers[i];
        distance = layer[0];
        circles = layer[1];
        l = len(circles);
        for (j = [0:l-1]) {
            c = circles[j];
            angle = c[0];
            dia = c[1];
            
            rotate(angle) {
                translate([distance,0]) {
                    circle(d = dia);
            
                    dm = dia-0.5;
                    #translate([0,-dm/2])
                    square([20, dm]);
                }
            }
        }
    }
}
